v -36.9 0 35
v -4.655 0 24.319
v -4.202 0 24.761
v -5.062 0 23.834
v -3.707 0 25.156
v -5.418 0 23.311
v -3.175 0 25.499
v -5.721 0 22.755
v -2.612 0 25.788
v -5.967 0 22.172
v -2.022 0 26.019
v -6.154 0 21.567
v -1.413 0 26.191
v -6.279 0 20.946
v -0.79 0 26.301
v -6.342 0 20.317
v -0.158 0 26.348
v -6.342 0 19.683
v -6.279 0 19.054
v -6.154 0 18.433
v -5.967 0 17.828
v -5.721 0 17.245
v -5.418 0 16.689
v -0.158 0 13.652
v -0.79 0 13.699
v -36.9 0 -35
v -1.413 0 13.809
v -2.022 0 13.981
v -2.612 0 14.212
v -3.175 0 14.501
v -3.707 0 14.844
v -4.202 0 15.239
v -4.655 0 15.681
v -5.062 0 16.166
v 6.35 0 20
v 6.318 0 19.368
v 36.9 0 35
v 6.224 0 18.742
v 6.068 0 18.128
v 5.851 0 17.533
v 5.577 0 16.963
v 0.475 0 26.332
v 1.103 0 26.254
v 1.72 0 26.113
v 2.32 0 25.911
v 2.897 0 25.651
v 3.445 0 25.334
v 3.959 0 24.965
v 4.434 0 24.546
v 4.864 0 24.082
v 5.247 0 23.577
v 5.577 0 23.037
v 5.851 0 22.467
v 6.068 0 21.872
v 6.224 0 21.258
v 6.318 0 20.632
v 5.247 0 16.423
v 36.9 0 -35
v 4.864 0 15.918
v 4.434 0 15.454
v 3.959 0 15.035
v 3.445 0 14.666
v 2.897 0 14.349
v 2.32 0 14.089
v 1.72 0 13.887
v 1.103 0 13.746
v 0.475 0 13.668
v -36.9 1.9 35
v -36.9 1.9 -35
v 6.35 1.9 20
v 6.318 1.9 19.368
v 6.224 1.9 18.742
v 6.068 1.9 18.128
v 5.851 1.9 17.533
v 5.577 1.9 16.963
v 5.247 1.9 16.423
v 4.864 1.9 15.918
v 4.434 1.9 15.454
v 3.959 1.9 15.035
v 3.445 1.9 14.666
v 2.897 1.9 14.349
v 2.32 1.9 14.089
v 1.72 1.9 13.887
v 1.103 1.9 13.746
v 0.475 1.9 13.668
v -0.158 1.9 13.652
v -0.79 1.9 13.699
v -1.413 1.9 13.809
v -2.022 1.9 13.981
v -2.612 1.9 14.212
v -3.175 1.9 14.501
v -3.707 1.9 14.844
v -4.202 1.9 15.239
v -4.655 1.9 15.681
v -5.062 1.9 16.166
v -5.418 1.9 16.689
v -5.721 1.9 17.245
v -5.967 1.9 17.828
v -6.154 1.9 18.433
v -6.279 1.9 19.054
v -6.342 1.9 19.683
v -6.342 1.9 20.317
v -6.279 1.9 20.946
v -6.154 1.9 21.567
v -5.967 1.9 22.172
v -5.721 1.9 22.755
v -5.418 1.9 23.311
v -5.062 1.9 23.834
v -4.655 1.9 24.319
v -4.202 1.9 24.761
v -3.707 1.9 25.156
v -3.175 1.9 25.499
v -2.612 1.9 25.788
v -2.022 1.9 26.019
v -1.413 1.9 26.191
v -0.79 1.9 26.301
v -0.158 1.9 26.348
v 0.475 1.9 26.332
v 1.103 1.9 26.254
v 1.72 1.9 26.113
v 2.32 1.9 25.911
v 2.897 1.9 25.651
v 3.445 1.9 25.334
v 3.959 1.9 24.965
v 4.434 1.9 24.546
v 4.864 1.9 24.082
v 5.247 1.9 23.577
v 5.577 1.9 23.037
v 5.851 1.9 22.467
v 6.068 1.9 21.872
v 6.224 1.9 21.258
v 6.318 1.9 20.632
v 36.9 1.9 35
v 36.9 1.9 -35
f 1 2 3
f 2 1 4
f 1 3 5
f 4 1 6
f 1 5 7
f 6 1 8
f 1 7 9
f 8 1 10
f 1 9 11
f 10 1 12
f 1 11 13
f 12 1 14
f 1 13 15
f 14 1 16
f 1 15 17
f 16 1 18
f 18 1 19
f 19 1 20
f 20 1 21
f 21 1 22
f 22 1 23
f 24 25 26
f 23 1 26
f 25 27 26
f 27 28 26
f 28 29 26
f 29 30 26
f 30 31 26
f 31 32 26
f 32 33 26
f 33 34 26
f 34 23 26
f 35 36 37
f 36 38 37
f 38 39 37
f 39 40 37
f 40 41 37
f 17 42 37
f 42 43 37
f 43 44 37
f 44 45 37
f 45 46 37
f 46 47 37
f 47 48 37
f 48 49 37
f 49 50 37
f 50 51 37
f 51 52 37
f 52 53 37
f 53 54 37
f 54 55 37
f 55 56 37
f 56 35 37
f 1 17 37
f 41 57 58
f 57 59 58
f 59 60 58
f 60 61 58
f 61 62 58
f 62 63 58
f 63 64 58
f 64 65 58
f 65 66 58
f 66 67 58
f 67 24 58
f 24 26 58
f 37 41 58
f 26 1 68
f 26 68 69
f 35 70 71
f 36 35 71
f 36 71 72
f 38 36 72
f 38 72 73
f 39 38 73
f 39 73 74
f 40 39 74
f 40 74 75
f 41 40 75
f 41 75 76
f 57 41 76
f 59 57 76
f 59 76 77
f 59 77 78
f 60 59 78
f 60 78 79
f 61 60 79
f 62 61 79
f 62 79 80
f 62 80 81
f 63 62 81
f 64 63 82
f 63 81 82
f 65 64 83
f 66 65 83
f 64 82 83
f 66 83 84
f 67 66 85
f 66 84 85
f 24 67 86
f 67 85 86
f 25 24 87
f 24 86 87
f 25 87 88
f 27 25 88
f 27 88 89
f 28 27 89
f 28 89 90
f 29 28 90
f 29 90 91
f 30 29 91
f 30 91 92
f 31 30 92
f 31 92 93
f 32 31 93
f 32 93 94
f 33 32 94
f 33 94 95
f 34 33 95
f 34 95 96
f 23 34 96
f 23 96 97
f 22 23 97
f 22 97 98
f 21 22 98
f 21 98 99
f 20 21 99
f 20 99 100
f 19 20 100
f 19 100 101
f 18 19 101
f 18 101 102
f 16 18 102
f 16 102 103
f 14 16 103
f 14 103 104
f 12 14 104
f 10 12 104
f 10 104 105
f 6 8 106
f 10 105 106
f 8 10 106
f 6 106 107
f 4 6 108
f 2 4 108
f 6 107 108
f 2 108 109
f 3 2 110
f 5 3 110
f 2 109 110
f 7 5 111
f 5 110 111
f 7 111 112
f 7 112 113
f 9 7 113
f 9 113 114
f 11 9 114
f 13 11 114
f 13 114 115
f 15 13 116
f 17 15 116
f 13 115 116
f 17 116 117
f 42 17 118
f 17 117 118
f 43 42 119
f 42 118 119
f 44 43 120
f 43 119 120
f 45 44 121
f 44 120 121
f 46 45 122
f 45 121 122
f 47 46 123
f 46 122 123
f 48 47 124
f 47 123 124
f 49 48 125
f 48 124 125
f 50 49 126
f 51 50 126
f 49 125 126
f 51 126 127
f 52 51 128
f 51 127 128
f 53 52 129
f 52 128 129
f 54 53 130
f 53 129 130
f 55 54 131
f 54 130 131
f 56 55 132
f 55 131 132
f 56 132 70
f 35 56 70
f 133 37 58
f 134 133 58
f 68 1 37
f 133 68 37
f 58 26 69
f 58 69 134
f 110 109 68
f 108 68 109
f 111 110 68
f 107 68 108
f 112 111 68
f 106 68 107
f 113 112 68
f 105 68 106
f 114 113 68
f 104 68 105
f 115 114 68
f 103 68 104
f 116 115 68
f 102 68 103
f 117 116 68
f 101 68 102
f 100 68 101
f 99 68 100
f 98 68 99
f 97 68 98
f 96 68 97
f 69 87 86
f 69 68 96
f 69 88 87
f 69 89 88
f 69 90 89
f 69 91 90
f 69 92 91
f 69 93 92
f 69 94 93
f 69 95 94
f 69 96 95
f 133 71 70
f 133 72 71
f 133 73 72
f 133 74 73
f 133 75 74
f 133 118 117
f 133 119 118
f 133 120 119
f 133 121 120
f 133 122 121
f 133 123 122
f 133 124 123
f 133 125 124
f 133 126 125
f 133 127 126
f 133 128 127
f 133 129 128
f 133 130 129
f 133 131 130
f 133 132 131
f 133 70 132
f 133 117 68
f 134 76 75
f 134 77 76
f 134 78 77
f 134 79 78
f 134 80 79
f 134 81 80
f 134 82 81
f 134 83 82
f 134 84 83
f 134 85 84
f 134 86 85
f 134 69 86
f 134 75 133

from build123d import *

# Parameters (mm, degrees)
CROQUIS1_W                 = 73.8
CROQUIS1_H                 = 70
SALIENTE_EXTRUIR1_DEPTH    = 1.9
CROQUIS2_R                 = 6.35
CORTAR_EXTRUIR1_DEPTH      = 1
CORTAR_EXTRUIR1_DEPTH_BACK = 2.9


with BuildPart() as part:
    # Croquis1 → Saliente-Extruir1 (new body)
    with BuildSketch(Plane(origin=(0, 0, 0), x_dir=(1, 0, 0), z_dir=(0, 1, 0))):
        Rectangle(CROQUIS1_W, CROQUIS1_H)
    extrude(amount=SALIENTE_EXTRUIR1_DEPTH)

    # Croquis2 → Cortar-Extruir1 (cut, two sides)
    with BuildSketch(Plane(origin=(0, 1.9, 0), x_dir=(1, 0, 0), z_dir=(0, 1, 0))) as cortar_extruir1_sk:
        with Locations((0, -20)):
            Circle(CROQUIS2_R)
    extrude(amount=CORTAR_EXTRUIR1_DEPTH, mode=Mode.SUBTRACT)
    extrude(cortar_extruir1_sk.sketch, amount=-CORTAR_EXTRUIR1_DEPTH_BACK, mode=Mode.SUBTRACT)


solid = part.part
